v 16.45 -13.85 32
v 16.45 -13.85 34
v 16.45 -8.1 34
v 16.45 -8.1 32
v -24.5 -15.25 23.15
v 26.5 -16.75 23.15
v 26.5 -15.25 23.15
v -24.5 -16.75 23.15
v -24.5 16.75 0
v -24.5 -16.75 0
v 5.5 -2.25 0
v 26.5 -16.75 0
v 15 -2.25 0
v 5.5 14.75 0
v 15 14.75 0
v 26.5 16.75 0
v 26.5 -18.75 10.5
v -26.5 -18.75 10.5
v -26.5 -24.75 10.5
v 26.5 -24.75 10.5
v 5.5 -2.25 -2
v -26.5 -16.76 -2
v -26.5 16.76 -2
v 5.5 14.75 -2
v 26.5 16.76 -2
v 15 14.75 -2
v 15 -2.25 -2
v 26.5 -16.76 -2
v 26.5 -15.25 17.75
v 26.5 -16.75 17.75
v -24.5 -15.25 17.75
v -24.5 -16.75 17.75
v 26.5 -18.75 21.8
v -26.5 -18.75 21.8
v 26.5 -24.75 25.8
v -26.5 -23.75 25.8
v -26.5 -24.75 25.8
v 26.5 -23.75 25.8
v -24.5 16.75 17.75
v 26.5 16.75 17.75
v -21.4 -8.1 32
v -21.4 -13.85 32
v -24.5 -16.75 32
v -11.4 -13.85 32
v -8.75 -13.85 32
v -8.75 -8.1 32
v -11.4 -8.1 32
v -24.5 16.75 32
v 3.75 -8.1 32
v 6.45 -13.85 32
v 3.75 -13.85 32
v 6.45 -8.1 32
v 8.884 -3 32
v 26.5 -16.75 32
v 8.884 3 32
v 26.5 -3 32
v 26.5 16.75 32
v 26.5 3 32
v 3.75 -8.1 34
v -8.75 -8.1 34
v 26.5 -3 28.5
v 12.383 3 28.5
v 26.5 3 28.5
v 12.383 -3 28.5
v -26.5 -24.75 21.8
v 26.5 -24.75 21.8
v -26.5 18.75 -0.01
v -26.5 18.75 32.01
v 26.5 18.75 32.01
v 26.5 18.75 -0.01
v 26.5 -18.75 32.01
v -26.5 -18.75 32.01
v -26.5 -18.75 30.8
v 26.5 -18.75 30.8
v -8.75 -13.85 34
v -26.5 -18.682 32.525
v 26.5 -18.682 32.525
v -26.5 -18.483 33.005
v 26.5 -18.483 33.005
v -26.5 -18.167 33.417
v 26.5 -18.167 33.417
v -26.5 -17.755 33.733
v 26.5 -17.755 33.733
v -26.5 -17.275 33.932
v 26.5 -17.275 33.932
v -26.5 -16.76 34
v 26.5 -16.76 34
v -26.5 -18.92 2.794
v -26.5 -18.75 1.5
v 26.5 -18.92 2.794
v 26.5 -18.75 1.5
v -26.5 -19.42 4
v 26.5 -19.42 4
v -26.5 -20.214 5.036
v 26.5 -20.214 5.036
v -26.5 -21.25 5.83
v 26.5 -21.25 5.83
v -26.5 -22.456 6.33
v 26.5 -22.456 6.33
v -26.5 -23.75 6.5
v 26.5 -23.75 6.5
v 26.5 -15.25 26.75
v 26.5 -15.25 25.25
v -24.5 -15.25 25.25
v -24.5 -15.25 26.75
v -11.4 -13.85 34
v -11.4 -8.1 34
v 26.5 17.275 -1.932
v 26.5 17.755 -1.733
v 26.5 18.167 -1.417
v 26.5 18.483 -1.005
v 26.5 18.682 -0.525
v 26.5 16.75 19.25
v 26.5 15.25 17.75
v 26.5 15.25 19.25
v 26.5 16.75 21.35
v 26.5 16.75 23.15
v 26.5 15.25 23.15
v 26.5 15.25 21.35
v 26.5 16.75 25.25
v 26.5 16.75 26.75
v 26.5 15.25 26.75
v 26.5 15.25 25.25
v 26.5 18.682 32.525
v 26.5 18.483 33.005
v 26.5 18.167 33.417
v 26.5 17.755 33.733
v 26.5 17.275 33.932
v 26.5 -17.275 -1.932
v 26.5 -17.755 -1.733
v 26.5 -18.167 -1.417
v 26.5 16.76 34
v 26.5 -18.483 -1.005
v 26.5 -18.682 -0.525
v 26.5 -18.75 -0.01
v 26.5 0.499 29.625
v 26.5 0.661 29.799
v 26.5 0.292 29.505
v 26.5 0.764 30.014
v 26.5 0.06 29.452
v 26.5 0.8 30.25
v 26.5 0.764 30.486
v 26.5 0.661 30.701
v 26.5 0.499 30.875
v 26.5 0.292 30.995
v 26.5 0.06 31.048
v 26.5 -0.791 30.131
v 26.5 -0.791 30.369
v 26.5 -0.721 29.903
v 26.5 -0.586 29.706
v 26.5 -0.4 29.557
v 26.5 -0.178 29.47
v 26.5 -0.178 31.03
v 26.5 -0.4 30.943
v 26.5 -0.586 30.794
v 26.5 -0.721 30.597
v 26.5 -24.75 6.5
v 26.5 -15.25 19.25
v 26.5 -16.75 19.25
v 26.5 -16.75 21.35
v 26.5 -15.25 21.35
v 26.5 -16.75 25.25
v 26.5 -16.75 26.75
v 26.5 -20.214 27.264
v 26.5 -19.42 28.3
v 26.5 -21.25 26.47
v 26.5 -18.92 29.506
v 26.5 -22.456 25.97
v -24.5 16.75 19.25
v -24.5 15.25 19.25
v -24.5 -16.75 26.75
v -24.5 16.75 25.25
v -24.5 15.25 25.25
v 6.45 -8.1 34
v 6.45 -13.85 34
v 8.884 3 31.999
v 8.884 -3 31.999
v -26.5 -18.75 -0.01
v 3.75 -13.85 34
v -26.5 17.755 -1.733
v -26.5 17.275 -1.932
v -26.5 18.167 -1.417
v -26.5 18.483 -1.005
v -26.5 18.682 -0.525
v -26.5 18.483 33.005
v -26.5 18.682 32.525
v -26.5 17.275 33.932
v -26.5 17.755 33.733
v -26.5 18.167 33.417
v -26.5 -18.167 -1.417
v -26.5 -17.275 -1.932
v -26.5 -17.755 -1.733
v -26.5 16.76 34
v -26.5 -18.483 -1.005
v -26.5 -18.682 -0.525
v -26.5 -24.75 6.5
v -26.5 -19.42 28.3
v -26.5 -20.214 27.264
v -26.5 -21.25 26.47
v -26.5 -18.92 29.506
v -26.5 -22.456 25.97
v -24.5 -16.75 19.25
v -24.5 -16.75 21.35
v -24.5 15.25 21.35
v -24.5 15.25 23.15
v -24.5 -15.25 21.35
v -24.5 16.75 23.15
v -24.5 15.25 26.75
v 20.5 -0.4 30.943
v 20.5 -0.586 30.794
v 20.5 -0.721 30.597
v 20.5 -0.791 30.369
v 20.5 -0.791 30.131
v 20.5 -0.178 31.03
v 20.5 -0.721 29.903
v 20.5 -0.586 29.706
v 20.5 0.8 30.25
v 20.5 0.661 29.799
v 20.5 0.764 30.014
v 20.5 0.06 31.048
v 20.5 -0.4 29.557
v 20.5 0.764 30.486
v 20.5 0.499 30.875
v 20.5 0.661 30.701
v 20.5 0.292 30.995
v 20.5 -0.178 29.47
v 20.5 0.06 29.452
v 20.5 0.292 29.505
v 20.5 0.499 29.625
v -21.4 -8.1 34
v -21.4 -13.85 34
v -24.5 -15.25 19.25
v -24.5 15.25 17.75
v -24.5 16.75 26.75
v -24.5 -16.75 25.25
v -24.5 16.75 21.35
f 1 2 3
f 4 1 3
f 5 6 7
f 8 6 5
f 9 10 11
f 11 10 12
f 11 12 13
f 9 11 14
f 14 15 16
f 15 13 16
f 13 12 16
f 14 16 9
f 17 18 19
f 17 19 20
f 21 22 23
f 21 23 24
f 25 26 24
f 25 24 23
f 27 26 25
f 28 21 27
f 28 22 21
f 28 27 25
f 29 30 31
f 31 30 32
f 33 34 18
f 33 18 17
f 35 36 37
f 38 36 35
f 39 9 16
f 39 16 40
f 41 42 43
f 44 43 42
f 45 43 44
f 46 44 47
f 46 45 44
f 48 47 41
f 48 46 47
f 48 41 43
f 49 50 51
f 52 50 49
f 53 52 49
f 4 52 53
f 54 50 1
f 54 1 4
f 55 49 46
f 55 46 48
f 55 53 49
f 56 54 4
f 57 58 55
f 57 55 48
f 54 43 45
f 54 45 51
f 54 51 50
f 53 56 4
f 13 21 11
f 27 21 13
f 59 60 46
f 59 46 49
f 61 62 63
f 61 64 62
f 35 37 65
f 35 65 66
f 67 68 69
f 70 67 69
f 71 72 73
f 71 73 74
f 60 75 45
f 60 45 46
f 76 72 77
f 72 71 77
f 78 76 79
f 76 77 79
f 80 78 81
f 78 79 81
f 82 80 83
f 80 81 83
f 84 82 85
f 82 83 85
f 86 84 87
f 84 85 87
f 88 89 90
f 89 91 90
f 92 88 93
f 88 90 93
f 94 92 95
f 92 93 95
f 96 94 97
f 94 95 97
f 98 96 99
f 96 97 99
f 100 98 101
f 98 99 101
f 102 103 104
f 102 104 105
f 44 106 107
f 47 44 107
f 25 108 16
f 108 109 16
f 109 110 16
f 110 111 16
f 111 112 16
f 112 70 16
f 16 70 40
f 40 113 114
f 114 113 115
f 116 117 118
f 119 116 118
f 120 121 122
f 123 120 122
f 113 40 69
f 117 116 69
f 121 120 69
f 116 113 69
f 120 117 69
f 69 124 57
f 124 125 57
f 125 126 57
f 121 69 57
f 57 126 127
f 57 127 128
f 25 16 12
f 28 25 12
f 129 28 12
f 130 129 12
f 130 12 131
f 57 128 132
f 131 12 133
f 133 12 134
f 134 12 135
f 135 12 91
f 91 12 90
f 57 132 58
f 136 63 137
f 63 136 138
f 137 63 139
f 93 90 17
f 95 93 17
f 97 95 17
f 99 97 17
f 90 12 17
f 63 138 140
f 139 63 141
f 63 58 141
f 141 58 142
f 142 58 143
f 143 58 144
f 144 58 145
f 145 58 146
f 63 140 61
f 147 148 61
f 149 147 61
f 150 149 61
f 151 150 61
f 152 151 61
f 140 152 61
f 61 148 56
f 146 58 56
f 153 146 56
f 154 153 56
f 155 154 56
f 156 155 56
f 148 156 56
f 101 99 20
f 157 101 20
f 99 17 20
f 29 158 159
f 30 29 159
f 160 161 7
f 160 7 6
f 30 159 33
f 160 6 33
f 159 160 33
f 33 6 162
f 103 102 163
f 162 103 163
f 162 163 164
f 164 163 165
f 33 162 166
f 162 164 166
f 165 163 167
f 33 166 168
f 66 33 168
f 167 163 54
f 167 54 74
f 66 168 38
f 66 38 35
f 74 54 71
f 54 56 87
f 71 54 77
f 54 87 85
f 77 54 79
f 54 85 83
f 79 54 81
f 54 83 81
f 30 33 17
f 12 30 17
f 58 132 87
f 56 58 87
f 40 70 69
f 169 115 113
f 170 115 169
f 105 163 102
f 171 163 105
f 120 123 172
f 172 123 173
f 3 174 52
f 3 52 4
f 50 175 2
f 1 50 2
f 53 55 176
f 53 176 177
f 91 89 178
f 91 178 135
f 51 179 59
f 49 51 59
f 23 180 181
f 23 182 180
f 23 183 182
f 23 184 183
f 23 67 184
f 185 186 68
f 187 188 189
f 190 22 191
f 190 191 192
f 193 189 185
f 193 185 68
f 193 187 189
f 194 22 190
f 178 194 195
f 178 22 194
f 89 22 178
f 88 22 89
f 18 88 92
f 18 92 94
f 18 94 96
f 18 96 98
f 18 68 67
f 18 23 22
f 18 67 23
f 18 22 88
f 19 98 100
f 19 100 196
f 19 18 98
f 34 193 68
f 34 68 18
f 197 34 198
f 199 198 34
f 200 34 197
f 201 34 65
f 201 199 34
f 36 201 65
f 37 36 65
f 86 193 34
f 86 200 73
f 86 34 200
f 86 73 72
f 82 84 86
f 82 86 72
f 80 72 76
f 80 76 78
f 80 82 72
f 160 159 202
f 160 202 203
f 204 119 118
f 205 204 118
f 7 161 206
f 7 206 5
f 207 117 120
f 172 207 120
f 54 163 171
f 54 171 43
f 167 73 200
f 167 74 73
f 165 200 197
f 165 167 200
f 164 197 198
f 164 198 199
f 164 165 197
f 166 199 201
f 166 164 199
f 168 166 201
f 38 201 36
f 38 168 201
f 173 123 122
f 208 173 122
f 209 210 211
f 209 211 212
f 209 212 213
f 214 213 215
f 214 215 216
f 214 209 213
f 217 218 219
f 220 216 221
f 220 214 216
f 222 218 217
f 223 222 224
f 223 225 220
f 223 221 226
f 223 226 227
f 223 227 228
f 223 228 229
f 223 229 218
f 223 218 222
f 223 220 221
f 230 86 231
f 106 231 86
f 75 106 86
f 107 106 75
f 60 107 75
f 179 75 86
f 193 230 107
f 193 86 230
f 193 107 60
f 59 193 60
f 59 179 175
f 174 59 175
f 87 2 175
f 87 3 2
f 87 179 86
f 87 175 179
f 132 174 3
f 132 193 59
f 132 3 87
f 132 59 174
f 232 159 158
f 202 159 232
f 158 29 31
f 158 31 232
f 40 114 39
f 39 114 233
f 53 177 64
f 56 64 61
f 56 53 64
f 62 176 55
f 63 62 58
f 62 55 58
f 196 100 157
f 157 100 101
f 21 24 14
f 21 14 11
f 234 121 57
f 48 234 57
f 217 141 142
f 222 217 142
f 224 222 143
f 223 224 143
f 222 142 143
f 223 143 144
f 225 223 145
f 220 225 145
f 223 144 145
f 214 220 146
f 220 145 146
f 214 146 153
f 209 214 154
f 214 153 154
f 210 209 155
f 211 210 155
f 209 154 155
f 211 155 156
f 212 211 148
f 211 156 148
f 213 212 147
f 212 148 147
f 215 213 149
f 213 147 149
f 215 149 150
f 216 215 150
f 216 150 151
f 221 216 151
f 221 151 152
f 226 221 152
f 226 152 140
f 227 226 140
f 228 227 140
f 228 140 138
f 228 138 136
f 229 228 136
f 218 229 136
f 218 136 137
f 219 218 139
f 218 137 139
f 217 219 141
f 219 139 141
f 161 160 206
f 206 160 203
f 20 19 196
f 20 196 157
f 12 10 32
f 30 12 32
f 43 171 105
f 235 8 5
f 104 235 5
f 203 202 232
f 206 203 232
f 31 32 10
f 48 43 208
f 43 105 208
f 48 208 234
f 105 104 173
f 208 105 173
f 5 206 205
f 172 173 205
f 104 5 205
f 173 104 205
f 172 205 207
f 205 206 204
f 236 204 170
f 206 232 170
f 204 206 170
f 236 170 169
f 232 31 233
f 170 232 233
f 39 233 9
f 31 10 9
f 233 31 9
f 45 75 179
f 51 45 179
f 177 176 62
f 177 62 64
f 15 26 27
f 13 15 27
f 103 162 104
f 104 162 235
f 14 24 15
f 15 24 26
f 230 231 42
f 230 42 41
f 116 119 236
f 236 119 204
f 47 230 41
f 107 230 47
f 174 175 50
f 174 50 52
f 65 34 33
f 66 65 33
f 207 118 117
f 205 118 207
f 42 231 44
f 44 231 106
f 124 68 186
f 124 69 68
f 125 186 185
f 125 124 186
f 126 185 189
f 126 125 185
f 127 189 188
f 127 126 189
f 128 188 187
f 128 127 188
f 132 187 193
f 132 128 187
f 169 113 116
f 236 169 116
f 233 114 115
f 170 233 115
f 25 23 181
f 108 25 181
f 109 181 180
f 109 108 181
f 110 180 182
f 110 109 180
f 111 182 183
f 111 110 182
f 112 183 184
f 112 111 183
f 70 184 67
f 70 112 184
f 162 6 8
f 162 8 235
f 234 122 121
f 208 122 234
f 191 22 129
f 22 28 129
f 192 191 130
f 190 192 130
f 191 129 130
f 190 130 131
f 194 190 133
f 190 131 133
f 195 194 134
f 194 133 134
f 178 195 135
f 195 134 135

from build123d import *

# Parameters (mm, degrees)
SKETCH_W        = 53
SKETCH_H        = 37.5
SKETCH_W_2      = 49
SKETCH_H_2      = 33.5
PAD_DEPTH       = 32
SKETCH001_W     = 53
SKETCH001_H     = 37.5
PAD001_DEPTH    = 2
SKETCH002_W     = 53
SKETCH002_H     = 37.5
PAD002_DEPTH    = 2
SKETCH003_W     = 33.5
SKETCH003_H     = 32
POCKET_DEPTH    = 2
SKETCH004_W     = 10
SKETCH004_H     = 5.75
SKETCH004_W_2   = 12.5
SKETCH004_W_3   = 9.9999999999
POCKET001_DEPTH = 5
SKETCH005_W     = 51
SKETCH005_H     = 1.8
SKETCH005_H_2   = 1.5
PAD003_DEPTH    = 33.5
SKETCH006_W     = 30.5
SKETCH006_H     = 9
POCKET002_DEPTH = 51
SKETCH007_W     = 17.616245
SKETCH007_H     = 6
PAD004_DEPTH    = 5
SKETCH008_R     = 0.8
POCKET003_DEPTH = 5
SKETCH009_W     = 17.616245
SKETCH009_H     = 6
PAD005_DEPTH    = 3.5
SKETCH010_R     = 0.8
POCKET004_DEPTH = 6
CHAMFER_SIZE    = 3.499
CHAMFER001_SIZE = 4.99
FILLET_R        = 1.99
SKETCH012_W     = 53
SKETCH012_H     = 4
PAD006_DEPTH    = 6
FILLET001_R     = 5
SKETCH013_W     = 6
SKETCH013_H     = 5
POCKET005_DEPTH = 20
SKETCH014_W     = 9.5
SKETCH014_H     = 17
POCKET006_DEPTH = 5


with BuildPart() as part:
    # Sketch → Pad (new body)
    with BuildSketch(Plane.XY):
        Rectangle(SKETCH_W, SKETCH_H)
        Rectangle(SKETCH_W_2, SKETCH_H_2, mode=Mode.SUBTRACT)
    extrude(amount=PAD_DEPTH)

    # Sketch001 (on Face10 of Pad) → Pad001 (join)
    with BuildSketch(Plane.XY.offset(32)):
        Rectangle(SKETCH001_W, SKETCH001_H)
    extrude(amount=PAD001_DEPTH)

    # Sketch002 (on Face4 of Pad001) → Pad002 (join)
    with BuildSketch(Plane(origin=(0, 0, 0), x_dir=(1, 0, 0), z_dir=(0, 0, -1))):
        Rectangle(SKETCH002_W, SKETCH002_H)
    extrude(amount=PAD002_DEPTH)

    # Sketch003 (on Face3 of Pad002) → Pocket (cut)
    with BuildSketch(Plane.YZ.offset(26.5)):
        with Locations((0, 16)):
            Rectangle(SKETCH003_W, SKETCH003_H)
    extrude(amount=-POCKET_DEPTH, mode=Mode.SUBTRACT)

    # Sketch004 (on Face13 of Pocket) → Pocket001 (cut)
    with BuildSketch(Plane.XY.offset(34)):
        with Locations((-16.4, -10.975)):
            Rectangle(SKETCH004_W, SKETCH004_H)
        with Locations((-2.5, -10.975)):
            Rectangle(SKETCH004_W_2, SKETCH004_H)
        with Locations((11.45, -10.975)):
            Rectangle(SKETCH004_W_3, SKETCH004_H)
    extrude(amount=-POCKET001_DEPTH, mode=Mode.SUBTRACT)

    # Sketch005 (on Face36 of Pocket001) → Pad003 (join)
    with BuildSketch(Plane(origin=(0, -16.75, 0), x_dir=(-1, 0, 0), z_dir=(0, 1, 0))):
        with Locations((-1, 22.25)):
            Rectangle(SKETCH005_W, SKETCH005_H)
        with Locations((-1, 26)):
            Rectangle(SKETCH005_W, SKETCH005_H_2)
        with Locations((-1, 18.5)):
            Rectangle(SKETCH005_W, SKETCH005_H_2)
    extrude(amount=PAD003_DEPTH)

    # Sketch006 (on Face11 of Pad003) → Pocket002 (cut)
    with BuildSketch(Plane.YZ.offset(26.5)):
        with Locations((0, 22.25)):
            Rectangle(SKETCH006_W, SKETCH006_H)
    extrude(amount=-POCKET002_DEPTH, mode=Mode.SUBTRACT)

    # Sketch007 (on Face57 of Pocket002) → Pad004 (join)
    with BuildSketch(Plane.XY):
        with Locations((17.6918775, 0)):
            Rectangle(SKETCH007_W, SKETCH007_H)
    extrude(amount=PAD004_DEPTH)

    # Sketch008 (on Face24 of Pad004) → Pocket003 (cut)
    with BuildSketch(Plane.YZ.offset(26.5)):
        with Locations((0, 2.5)):
            Circle(SKETCH008_R)
    extrude(amount=-POCKET003_DEPTH, mode=Mode.SUBTRACT)

    # Sketch009 (on Face65 of Pocket003) → Pad005 (join)
    with BuildSketch(Plane(origin=(0, 0, 32), x_dir=(1, 0, 0), z_dir=(0, 0, -1))):
        with Locations((17.6918775, 0)):
            Rectangle(SKETCH009_W, SKETCH009_H)
    extrude(amount=PAD005_DEPTH)

    # Sketch010 (on Face41 of Pad005) → Pocket004 (cut)
    with BuildSketch(Plane.YZ.offset(26.5)):
        with Locations((0, 30.25)):
            Circle(SKETCH010_R)
    extrude(amount=-POCKET004_DEPTH, mode=Mode.SUBTRACT)

    # Chamfer
    chamfer_edges = [part.edges().sort_by_distance(p)[0] for p in [
        (8.883755, 0, 28.5),
    ]]
    chamfer(chamfer_edges, length=CHAMFER_SIZE)

    # Chamfer001
    chamfer001_edges = [part.edges().sort_by_distance(p)[0] for p in [
        (8.883755, 0, 5),
    ]]
    chamfer(chamfer001_edges, length=CHAMFER001_SIZE)

    # Fillet
    fillet_edges = [part.edges().sort_by_distance(p)[0] for p in [
        (0, -18.75, 34),
        (0, 18.75, 34),
        (0, 18.75, -2),
        (0, -18.75, -2),
    ]]
    fillet(fillet_edges, radius=FILLET_R)

    # Sketch012 → Pad006 (join)
    with BuildSketch(Plane.XZ.offset(18.75)):
        with Locations((0, 23.8)):
            Rectangle(SKETCH012_W, SKETCH012_H)
        with Locations((0, 8.5)):
            Rectangle(SKETCH012_W, SKETCH012_H)
    extrude(amount=PAD006_DEPTH)

    # Fillet001
    fillet001_edges = [part.edges().sort_by_distance(p)[0] for p in [
        (0, -18.75, 6.5),
        (0, -18.75, 25.8),
    ]]
    fillet(fillet001_edges, radius=FILLET001_R)

    # Sketch013 (on Face26 of Fillet001) → Pocket005 (cut)
    with BuildSketch(Plane.YZ.offset(26.5)):
        with Locations((0, 2.5)):
            Rectangle(SKETCH013_W, SKETCH013_H)
    extrude(amount=-POCKET005_DEPTH, mode=Mode.SUBTRACT)

    # Sketch014 (on Face23 of Pocket005) → Pocket006 (cut)
    with BuildSketch(Plane(origin=(0, 0, -2), x_dir=(1, 0, 0), z_dir=(0, 0, -1))):
        with Locations((10.25, -6.25)):
            Rectangle(SKETCH014_W, SKETCH014_H)
    extrude(amount=-POCKET006_DEPTH, mode=Mode.SUBTRACT)


solid = part.part
